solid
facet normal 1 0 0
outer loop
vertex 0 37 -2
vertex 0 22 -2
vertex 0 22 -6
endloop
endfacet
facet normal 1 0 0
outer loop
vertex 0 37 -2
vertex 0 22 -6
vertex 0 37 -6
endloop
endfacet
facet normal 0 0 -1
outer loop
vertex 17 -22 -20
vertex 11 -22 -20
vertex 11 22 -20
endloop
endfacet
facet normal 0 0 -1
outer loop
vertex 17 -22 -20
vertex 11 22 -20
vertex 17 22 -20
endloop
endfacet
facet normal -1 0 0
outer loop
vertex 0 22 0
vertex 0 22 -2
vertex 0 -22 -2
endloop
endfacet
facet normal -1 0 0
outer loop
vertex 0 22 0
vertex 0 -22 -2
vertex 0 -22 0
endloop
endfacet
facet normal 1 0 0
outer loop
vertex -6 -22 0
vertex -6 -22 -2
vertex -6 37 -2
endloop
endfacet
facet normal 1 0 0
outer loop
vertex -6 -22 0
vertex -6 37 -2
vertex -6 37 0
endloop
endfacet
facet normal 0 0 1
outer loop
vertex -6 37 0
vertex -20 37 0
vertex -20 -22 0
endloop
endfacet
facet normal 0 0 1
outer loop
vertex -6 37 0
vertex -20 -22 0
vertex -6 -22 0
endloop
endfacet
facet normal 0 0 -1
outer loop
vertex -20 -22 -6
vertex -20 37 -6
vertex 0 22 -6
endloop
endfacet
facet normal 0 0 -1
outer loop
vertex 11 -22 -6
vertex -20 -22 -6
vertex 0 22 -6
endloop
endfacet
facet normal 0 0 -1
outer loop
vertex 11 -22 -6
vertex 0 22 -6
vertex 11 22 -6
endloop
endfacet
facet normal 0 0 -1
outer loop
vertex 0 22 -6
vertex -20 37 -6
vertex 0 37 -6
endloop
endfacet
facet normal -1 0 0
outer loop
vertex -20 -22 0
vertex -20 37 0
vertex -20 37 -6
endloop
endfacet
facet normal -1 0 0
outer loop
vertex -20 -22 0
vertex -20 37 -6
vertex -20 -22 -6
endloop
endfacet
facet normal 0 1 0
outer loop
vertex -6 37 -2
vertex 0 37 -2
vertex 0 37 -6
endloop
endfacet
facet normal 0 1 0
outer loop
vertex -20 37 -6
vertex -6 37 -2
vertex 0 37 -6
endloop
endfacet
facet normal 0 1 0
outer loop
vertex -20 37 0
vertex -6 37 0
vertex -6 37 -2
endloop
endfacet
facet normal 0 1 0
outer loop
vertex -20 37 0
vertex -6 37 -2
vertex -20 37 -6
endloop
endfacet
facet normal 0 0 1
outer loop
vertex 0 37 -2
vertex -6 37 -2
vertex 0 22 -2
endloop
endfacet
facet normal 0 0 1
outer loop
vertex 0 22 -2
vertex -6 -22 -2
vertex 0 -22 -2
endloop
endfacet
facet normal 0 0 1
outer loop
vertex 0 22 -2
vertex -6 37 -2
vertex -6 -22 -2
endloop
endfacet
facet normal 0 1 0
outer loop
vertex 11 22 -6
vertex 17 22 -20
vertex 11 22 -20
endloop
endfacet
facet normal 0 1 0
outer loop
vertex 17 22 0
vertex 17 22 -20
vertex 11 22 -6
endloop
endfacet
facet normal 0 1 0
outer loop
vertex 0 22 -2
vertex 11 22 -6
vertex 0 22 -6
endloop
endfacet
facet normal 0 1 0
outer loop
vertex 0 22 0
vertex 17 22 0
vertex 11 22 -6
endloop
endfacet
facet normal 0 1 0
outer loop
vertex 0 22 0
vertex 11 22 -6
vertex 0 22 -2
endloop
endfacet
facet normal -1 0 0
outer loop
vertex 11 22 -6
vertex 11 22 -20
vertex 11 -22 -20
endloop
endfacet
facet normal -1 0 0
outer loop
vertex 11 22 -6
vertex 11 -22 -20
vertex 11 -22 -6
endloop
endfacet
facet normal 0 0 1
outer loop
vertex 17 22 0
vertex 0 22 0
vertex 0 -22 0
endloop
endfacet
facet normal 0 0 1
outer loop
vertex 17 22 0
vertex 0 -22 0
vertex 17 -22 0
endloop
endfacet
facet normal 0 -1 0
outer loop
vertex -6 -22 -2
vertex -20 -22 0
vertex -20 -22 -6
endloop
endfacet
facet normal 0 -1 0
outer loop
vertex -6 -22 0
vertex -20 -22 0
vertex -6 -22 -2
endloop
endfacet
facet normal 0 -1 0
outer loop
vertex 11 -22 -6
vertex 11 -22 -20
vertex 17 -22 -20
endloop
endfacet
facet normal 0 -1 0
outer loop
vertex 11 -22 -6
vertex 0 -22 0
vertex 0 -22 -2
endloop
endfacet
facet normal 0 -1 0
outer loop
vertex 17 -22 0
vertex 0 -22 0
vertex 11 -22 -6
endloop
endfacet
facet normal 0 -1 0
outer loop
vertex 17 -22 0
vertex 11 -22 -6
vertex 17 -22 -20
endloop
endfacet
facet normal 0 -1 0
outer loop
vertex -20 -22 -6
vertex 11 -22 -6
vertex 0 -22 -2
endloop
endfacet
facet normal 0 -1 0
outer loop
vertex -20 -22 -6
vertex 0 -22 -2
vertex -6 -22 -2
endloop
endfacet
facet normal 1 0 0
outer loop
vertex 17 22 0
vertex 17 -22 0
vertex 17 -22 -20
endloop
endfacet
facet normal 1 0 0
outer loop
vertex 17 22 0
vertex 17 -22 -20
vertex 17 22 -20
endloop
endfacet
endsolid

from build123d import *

# Parameters (mm, degrees)
PAD_DEPTH            = 20
SKETCH001_W          = 31
SKETCH001_H          = 14
POCKET_DEPTH         = 37.001
POCKET_DEPTH_BACK    = -22.001
SKETCH002_W          = 6
SKETCH002_H          = 2
POCKET001_DEPTH      = 37.001
POCKET001_DEPTH_BACK = -22.001


with BuildPart() as part:
    # Sketch → Pad (new body)
    with BuildSketch(Plane.XY):
        Polygon((-20, 37), (-20, -22), (17, -22), (17, 22), (0, 22), (0, 37), align=None)
    extrude(amount=-PAD_DEPTH)

    # Sketch001 → Pocket (cut, two sides)
    with BuildSketch(Plane.XZ) as pocket_sk:
        with Locations((-4.5, -13)):
            Rectangle(SKETCH001_W, SKETCH001_H)
    extrude(amount=-POCKET_DEPTH, mode=Mode.SUBTRACT)
    extrude(pocket_sk.sketch, amount=-POCKET_DEPTH_BACK, mode=Mode.SUBTRACT)

    # Sketch002 → Pocket001 (cut, two sides)
    with BuildSketch(Plane.XZ) as pocket001_sk:
        with Locations((-3, -1)):
            Rectangle(SKETCH002_W, SKETCH002_H)
    extrude(amount=-POCKET001_DEPTH, mode=Mode.SUBTRACT)
    extrude(pocket001_sk.sketch, amount=-POCKET001_DEPTH_BACK, mode=Mode.SUBTRACT)


solid = part.part
